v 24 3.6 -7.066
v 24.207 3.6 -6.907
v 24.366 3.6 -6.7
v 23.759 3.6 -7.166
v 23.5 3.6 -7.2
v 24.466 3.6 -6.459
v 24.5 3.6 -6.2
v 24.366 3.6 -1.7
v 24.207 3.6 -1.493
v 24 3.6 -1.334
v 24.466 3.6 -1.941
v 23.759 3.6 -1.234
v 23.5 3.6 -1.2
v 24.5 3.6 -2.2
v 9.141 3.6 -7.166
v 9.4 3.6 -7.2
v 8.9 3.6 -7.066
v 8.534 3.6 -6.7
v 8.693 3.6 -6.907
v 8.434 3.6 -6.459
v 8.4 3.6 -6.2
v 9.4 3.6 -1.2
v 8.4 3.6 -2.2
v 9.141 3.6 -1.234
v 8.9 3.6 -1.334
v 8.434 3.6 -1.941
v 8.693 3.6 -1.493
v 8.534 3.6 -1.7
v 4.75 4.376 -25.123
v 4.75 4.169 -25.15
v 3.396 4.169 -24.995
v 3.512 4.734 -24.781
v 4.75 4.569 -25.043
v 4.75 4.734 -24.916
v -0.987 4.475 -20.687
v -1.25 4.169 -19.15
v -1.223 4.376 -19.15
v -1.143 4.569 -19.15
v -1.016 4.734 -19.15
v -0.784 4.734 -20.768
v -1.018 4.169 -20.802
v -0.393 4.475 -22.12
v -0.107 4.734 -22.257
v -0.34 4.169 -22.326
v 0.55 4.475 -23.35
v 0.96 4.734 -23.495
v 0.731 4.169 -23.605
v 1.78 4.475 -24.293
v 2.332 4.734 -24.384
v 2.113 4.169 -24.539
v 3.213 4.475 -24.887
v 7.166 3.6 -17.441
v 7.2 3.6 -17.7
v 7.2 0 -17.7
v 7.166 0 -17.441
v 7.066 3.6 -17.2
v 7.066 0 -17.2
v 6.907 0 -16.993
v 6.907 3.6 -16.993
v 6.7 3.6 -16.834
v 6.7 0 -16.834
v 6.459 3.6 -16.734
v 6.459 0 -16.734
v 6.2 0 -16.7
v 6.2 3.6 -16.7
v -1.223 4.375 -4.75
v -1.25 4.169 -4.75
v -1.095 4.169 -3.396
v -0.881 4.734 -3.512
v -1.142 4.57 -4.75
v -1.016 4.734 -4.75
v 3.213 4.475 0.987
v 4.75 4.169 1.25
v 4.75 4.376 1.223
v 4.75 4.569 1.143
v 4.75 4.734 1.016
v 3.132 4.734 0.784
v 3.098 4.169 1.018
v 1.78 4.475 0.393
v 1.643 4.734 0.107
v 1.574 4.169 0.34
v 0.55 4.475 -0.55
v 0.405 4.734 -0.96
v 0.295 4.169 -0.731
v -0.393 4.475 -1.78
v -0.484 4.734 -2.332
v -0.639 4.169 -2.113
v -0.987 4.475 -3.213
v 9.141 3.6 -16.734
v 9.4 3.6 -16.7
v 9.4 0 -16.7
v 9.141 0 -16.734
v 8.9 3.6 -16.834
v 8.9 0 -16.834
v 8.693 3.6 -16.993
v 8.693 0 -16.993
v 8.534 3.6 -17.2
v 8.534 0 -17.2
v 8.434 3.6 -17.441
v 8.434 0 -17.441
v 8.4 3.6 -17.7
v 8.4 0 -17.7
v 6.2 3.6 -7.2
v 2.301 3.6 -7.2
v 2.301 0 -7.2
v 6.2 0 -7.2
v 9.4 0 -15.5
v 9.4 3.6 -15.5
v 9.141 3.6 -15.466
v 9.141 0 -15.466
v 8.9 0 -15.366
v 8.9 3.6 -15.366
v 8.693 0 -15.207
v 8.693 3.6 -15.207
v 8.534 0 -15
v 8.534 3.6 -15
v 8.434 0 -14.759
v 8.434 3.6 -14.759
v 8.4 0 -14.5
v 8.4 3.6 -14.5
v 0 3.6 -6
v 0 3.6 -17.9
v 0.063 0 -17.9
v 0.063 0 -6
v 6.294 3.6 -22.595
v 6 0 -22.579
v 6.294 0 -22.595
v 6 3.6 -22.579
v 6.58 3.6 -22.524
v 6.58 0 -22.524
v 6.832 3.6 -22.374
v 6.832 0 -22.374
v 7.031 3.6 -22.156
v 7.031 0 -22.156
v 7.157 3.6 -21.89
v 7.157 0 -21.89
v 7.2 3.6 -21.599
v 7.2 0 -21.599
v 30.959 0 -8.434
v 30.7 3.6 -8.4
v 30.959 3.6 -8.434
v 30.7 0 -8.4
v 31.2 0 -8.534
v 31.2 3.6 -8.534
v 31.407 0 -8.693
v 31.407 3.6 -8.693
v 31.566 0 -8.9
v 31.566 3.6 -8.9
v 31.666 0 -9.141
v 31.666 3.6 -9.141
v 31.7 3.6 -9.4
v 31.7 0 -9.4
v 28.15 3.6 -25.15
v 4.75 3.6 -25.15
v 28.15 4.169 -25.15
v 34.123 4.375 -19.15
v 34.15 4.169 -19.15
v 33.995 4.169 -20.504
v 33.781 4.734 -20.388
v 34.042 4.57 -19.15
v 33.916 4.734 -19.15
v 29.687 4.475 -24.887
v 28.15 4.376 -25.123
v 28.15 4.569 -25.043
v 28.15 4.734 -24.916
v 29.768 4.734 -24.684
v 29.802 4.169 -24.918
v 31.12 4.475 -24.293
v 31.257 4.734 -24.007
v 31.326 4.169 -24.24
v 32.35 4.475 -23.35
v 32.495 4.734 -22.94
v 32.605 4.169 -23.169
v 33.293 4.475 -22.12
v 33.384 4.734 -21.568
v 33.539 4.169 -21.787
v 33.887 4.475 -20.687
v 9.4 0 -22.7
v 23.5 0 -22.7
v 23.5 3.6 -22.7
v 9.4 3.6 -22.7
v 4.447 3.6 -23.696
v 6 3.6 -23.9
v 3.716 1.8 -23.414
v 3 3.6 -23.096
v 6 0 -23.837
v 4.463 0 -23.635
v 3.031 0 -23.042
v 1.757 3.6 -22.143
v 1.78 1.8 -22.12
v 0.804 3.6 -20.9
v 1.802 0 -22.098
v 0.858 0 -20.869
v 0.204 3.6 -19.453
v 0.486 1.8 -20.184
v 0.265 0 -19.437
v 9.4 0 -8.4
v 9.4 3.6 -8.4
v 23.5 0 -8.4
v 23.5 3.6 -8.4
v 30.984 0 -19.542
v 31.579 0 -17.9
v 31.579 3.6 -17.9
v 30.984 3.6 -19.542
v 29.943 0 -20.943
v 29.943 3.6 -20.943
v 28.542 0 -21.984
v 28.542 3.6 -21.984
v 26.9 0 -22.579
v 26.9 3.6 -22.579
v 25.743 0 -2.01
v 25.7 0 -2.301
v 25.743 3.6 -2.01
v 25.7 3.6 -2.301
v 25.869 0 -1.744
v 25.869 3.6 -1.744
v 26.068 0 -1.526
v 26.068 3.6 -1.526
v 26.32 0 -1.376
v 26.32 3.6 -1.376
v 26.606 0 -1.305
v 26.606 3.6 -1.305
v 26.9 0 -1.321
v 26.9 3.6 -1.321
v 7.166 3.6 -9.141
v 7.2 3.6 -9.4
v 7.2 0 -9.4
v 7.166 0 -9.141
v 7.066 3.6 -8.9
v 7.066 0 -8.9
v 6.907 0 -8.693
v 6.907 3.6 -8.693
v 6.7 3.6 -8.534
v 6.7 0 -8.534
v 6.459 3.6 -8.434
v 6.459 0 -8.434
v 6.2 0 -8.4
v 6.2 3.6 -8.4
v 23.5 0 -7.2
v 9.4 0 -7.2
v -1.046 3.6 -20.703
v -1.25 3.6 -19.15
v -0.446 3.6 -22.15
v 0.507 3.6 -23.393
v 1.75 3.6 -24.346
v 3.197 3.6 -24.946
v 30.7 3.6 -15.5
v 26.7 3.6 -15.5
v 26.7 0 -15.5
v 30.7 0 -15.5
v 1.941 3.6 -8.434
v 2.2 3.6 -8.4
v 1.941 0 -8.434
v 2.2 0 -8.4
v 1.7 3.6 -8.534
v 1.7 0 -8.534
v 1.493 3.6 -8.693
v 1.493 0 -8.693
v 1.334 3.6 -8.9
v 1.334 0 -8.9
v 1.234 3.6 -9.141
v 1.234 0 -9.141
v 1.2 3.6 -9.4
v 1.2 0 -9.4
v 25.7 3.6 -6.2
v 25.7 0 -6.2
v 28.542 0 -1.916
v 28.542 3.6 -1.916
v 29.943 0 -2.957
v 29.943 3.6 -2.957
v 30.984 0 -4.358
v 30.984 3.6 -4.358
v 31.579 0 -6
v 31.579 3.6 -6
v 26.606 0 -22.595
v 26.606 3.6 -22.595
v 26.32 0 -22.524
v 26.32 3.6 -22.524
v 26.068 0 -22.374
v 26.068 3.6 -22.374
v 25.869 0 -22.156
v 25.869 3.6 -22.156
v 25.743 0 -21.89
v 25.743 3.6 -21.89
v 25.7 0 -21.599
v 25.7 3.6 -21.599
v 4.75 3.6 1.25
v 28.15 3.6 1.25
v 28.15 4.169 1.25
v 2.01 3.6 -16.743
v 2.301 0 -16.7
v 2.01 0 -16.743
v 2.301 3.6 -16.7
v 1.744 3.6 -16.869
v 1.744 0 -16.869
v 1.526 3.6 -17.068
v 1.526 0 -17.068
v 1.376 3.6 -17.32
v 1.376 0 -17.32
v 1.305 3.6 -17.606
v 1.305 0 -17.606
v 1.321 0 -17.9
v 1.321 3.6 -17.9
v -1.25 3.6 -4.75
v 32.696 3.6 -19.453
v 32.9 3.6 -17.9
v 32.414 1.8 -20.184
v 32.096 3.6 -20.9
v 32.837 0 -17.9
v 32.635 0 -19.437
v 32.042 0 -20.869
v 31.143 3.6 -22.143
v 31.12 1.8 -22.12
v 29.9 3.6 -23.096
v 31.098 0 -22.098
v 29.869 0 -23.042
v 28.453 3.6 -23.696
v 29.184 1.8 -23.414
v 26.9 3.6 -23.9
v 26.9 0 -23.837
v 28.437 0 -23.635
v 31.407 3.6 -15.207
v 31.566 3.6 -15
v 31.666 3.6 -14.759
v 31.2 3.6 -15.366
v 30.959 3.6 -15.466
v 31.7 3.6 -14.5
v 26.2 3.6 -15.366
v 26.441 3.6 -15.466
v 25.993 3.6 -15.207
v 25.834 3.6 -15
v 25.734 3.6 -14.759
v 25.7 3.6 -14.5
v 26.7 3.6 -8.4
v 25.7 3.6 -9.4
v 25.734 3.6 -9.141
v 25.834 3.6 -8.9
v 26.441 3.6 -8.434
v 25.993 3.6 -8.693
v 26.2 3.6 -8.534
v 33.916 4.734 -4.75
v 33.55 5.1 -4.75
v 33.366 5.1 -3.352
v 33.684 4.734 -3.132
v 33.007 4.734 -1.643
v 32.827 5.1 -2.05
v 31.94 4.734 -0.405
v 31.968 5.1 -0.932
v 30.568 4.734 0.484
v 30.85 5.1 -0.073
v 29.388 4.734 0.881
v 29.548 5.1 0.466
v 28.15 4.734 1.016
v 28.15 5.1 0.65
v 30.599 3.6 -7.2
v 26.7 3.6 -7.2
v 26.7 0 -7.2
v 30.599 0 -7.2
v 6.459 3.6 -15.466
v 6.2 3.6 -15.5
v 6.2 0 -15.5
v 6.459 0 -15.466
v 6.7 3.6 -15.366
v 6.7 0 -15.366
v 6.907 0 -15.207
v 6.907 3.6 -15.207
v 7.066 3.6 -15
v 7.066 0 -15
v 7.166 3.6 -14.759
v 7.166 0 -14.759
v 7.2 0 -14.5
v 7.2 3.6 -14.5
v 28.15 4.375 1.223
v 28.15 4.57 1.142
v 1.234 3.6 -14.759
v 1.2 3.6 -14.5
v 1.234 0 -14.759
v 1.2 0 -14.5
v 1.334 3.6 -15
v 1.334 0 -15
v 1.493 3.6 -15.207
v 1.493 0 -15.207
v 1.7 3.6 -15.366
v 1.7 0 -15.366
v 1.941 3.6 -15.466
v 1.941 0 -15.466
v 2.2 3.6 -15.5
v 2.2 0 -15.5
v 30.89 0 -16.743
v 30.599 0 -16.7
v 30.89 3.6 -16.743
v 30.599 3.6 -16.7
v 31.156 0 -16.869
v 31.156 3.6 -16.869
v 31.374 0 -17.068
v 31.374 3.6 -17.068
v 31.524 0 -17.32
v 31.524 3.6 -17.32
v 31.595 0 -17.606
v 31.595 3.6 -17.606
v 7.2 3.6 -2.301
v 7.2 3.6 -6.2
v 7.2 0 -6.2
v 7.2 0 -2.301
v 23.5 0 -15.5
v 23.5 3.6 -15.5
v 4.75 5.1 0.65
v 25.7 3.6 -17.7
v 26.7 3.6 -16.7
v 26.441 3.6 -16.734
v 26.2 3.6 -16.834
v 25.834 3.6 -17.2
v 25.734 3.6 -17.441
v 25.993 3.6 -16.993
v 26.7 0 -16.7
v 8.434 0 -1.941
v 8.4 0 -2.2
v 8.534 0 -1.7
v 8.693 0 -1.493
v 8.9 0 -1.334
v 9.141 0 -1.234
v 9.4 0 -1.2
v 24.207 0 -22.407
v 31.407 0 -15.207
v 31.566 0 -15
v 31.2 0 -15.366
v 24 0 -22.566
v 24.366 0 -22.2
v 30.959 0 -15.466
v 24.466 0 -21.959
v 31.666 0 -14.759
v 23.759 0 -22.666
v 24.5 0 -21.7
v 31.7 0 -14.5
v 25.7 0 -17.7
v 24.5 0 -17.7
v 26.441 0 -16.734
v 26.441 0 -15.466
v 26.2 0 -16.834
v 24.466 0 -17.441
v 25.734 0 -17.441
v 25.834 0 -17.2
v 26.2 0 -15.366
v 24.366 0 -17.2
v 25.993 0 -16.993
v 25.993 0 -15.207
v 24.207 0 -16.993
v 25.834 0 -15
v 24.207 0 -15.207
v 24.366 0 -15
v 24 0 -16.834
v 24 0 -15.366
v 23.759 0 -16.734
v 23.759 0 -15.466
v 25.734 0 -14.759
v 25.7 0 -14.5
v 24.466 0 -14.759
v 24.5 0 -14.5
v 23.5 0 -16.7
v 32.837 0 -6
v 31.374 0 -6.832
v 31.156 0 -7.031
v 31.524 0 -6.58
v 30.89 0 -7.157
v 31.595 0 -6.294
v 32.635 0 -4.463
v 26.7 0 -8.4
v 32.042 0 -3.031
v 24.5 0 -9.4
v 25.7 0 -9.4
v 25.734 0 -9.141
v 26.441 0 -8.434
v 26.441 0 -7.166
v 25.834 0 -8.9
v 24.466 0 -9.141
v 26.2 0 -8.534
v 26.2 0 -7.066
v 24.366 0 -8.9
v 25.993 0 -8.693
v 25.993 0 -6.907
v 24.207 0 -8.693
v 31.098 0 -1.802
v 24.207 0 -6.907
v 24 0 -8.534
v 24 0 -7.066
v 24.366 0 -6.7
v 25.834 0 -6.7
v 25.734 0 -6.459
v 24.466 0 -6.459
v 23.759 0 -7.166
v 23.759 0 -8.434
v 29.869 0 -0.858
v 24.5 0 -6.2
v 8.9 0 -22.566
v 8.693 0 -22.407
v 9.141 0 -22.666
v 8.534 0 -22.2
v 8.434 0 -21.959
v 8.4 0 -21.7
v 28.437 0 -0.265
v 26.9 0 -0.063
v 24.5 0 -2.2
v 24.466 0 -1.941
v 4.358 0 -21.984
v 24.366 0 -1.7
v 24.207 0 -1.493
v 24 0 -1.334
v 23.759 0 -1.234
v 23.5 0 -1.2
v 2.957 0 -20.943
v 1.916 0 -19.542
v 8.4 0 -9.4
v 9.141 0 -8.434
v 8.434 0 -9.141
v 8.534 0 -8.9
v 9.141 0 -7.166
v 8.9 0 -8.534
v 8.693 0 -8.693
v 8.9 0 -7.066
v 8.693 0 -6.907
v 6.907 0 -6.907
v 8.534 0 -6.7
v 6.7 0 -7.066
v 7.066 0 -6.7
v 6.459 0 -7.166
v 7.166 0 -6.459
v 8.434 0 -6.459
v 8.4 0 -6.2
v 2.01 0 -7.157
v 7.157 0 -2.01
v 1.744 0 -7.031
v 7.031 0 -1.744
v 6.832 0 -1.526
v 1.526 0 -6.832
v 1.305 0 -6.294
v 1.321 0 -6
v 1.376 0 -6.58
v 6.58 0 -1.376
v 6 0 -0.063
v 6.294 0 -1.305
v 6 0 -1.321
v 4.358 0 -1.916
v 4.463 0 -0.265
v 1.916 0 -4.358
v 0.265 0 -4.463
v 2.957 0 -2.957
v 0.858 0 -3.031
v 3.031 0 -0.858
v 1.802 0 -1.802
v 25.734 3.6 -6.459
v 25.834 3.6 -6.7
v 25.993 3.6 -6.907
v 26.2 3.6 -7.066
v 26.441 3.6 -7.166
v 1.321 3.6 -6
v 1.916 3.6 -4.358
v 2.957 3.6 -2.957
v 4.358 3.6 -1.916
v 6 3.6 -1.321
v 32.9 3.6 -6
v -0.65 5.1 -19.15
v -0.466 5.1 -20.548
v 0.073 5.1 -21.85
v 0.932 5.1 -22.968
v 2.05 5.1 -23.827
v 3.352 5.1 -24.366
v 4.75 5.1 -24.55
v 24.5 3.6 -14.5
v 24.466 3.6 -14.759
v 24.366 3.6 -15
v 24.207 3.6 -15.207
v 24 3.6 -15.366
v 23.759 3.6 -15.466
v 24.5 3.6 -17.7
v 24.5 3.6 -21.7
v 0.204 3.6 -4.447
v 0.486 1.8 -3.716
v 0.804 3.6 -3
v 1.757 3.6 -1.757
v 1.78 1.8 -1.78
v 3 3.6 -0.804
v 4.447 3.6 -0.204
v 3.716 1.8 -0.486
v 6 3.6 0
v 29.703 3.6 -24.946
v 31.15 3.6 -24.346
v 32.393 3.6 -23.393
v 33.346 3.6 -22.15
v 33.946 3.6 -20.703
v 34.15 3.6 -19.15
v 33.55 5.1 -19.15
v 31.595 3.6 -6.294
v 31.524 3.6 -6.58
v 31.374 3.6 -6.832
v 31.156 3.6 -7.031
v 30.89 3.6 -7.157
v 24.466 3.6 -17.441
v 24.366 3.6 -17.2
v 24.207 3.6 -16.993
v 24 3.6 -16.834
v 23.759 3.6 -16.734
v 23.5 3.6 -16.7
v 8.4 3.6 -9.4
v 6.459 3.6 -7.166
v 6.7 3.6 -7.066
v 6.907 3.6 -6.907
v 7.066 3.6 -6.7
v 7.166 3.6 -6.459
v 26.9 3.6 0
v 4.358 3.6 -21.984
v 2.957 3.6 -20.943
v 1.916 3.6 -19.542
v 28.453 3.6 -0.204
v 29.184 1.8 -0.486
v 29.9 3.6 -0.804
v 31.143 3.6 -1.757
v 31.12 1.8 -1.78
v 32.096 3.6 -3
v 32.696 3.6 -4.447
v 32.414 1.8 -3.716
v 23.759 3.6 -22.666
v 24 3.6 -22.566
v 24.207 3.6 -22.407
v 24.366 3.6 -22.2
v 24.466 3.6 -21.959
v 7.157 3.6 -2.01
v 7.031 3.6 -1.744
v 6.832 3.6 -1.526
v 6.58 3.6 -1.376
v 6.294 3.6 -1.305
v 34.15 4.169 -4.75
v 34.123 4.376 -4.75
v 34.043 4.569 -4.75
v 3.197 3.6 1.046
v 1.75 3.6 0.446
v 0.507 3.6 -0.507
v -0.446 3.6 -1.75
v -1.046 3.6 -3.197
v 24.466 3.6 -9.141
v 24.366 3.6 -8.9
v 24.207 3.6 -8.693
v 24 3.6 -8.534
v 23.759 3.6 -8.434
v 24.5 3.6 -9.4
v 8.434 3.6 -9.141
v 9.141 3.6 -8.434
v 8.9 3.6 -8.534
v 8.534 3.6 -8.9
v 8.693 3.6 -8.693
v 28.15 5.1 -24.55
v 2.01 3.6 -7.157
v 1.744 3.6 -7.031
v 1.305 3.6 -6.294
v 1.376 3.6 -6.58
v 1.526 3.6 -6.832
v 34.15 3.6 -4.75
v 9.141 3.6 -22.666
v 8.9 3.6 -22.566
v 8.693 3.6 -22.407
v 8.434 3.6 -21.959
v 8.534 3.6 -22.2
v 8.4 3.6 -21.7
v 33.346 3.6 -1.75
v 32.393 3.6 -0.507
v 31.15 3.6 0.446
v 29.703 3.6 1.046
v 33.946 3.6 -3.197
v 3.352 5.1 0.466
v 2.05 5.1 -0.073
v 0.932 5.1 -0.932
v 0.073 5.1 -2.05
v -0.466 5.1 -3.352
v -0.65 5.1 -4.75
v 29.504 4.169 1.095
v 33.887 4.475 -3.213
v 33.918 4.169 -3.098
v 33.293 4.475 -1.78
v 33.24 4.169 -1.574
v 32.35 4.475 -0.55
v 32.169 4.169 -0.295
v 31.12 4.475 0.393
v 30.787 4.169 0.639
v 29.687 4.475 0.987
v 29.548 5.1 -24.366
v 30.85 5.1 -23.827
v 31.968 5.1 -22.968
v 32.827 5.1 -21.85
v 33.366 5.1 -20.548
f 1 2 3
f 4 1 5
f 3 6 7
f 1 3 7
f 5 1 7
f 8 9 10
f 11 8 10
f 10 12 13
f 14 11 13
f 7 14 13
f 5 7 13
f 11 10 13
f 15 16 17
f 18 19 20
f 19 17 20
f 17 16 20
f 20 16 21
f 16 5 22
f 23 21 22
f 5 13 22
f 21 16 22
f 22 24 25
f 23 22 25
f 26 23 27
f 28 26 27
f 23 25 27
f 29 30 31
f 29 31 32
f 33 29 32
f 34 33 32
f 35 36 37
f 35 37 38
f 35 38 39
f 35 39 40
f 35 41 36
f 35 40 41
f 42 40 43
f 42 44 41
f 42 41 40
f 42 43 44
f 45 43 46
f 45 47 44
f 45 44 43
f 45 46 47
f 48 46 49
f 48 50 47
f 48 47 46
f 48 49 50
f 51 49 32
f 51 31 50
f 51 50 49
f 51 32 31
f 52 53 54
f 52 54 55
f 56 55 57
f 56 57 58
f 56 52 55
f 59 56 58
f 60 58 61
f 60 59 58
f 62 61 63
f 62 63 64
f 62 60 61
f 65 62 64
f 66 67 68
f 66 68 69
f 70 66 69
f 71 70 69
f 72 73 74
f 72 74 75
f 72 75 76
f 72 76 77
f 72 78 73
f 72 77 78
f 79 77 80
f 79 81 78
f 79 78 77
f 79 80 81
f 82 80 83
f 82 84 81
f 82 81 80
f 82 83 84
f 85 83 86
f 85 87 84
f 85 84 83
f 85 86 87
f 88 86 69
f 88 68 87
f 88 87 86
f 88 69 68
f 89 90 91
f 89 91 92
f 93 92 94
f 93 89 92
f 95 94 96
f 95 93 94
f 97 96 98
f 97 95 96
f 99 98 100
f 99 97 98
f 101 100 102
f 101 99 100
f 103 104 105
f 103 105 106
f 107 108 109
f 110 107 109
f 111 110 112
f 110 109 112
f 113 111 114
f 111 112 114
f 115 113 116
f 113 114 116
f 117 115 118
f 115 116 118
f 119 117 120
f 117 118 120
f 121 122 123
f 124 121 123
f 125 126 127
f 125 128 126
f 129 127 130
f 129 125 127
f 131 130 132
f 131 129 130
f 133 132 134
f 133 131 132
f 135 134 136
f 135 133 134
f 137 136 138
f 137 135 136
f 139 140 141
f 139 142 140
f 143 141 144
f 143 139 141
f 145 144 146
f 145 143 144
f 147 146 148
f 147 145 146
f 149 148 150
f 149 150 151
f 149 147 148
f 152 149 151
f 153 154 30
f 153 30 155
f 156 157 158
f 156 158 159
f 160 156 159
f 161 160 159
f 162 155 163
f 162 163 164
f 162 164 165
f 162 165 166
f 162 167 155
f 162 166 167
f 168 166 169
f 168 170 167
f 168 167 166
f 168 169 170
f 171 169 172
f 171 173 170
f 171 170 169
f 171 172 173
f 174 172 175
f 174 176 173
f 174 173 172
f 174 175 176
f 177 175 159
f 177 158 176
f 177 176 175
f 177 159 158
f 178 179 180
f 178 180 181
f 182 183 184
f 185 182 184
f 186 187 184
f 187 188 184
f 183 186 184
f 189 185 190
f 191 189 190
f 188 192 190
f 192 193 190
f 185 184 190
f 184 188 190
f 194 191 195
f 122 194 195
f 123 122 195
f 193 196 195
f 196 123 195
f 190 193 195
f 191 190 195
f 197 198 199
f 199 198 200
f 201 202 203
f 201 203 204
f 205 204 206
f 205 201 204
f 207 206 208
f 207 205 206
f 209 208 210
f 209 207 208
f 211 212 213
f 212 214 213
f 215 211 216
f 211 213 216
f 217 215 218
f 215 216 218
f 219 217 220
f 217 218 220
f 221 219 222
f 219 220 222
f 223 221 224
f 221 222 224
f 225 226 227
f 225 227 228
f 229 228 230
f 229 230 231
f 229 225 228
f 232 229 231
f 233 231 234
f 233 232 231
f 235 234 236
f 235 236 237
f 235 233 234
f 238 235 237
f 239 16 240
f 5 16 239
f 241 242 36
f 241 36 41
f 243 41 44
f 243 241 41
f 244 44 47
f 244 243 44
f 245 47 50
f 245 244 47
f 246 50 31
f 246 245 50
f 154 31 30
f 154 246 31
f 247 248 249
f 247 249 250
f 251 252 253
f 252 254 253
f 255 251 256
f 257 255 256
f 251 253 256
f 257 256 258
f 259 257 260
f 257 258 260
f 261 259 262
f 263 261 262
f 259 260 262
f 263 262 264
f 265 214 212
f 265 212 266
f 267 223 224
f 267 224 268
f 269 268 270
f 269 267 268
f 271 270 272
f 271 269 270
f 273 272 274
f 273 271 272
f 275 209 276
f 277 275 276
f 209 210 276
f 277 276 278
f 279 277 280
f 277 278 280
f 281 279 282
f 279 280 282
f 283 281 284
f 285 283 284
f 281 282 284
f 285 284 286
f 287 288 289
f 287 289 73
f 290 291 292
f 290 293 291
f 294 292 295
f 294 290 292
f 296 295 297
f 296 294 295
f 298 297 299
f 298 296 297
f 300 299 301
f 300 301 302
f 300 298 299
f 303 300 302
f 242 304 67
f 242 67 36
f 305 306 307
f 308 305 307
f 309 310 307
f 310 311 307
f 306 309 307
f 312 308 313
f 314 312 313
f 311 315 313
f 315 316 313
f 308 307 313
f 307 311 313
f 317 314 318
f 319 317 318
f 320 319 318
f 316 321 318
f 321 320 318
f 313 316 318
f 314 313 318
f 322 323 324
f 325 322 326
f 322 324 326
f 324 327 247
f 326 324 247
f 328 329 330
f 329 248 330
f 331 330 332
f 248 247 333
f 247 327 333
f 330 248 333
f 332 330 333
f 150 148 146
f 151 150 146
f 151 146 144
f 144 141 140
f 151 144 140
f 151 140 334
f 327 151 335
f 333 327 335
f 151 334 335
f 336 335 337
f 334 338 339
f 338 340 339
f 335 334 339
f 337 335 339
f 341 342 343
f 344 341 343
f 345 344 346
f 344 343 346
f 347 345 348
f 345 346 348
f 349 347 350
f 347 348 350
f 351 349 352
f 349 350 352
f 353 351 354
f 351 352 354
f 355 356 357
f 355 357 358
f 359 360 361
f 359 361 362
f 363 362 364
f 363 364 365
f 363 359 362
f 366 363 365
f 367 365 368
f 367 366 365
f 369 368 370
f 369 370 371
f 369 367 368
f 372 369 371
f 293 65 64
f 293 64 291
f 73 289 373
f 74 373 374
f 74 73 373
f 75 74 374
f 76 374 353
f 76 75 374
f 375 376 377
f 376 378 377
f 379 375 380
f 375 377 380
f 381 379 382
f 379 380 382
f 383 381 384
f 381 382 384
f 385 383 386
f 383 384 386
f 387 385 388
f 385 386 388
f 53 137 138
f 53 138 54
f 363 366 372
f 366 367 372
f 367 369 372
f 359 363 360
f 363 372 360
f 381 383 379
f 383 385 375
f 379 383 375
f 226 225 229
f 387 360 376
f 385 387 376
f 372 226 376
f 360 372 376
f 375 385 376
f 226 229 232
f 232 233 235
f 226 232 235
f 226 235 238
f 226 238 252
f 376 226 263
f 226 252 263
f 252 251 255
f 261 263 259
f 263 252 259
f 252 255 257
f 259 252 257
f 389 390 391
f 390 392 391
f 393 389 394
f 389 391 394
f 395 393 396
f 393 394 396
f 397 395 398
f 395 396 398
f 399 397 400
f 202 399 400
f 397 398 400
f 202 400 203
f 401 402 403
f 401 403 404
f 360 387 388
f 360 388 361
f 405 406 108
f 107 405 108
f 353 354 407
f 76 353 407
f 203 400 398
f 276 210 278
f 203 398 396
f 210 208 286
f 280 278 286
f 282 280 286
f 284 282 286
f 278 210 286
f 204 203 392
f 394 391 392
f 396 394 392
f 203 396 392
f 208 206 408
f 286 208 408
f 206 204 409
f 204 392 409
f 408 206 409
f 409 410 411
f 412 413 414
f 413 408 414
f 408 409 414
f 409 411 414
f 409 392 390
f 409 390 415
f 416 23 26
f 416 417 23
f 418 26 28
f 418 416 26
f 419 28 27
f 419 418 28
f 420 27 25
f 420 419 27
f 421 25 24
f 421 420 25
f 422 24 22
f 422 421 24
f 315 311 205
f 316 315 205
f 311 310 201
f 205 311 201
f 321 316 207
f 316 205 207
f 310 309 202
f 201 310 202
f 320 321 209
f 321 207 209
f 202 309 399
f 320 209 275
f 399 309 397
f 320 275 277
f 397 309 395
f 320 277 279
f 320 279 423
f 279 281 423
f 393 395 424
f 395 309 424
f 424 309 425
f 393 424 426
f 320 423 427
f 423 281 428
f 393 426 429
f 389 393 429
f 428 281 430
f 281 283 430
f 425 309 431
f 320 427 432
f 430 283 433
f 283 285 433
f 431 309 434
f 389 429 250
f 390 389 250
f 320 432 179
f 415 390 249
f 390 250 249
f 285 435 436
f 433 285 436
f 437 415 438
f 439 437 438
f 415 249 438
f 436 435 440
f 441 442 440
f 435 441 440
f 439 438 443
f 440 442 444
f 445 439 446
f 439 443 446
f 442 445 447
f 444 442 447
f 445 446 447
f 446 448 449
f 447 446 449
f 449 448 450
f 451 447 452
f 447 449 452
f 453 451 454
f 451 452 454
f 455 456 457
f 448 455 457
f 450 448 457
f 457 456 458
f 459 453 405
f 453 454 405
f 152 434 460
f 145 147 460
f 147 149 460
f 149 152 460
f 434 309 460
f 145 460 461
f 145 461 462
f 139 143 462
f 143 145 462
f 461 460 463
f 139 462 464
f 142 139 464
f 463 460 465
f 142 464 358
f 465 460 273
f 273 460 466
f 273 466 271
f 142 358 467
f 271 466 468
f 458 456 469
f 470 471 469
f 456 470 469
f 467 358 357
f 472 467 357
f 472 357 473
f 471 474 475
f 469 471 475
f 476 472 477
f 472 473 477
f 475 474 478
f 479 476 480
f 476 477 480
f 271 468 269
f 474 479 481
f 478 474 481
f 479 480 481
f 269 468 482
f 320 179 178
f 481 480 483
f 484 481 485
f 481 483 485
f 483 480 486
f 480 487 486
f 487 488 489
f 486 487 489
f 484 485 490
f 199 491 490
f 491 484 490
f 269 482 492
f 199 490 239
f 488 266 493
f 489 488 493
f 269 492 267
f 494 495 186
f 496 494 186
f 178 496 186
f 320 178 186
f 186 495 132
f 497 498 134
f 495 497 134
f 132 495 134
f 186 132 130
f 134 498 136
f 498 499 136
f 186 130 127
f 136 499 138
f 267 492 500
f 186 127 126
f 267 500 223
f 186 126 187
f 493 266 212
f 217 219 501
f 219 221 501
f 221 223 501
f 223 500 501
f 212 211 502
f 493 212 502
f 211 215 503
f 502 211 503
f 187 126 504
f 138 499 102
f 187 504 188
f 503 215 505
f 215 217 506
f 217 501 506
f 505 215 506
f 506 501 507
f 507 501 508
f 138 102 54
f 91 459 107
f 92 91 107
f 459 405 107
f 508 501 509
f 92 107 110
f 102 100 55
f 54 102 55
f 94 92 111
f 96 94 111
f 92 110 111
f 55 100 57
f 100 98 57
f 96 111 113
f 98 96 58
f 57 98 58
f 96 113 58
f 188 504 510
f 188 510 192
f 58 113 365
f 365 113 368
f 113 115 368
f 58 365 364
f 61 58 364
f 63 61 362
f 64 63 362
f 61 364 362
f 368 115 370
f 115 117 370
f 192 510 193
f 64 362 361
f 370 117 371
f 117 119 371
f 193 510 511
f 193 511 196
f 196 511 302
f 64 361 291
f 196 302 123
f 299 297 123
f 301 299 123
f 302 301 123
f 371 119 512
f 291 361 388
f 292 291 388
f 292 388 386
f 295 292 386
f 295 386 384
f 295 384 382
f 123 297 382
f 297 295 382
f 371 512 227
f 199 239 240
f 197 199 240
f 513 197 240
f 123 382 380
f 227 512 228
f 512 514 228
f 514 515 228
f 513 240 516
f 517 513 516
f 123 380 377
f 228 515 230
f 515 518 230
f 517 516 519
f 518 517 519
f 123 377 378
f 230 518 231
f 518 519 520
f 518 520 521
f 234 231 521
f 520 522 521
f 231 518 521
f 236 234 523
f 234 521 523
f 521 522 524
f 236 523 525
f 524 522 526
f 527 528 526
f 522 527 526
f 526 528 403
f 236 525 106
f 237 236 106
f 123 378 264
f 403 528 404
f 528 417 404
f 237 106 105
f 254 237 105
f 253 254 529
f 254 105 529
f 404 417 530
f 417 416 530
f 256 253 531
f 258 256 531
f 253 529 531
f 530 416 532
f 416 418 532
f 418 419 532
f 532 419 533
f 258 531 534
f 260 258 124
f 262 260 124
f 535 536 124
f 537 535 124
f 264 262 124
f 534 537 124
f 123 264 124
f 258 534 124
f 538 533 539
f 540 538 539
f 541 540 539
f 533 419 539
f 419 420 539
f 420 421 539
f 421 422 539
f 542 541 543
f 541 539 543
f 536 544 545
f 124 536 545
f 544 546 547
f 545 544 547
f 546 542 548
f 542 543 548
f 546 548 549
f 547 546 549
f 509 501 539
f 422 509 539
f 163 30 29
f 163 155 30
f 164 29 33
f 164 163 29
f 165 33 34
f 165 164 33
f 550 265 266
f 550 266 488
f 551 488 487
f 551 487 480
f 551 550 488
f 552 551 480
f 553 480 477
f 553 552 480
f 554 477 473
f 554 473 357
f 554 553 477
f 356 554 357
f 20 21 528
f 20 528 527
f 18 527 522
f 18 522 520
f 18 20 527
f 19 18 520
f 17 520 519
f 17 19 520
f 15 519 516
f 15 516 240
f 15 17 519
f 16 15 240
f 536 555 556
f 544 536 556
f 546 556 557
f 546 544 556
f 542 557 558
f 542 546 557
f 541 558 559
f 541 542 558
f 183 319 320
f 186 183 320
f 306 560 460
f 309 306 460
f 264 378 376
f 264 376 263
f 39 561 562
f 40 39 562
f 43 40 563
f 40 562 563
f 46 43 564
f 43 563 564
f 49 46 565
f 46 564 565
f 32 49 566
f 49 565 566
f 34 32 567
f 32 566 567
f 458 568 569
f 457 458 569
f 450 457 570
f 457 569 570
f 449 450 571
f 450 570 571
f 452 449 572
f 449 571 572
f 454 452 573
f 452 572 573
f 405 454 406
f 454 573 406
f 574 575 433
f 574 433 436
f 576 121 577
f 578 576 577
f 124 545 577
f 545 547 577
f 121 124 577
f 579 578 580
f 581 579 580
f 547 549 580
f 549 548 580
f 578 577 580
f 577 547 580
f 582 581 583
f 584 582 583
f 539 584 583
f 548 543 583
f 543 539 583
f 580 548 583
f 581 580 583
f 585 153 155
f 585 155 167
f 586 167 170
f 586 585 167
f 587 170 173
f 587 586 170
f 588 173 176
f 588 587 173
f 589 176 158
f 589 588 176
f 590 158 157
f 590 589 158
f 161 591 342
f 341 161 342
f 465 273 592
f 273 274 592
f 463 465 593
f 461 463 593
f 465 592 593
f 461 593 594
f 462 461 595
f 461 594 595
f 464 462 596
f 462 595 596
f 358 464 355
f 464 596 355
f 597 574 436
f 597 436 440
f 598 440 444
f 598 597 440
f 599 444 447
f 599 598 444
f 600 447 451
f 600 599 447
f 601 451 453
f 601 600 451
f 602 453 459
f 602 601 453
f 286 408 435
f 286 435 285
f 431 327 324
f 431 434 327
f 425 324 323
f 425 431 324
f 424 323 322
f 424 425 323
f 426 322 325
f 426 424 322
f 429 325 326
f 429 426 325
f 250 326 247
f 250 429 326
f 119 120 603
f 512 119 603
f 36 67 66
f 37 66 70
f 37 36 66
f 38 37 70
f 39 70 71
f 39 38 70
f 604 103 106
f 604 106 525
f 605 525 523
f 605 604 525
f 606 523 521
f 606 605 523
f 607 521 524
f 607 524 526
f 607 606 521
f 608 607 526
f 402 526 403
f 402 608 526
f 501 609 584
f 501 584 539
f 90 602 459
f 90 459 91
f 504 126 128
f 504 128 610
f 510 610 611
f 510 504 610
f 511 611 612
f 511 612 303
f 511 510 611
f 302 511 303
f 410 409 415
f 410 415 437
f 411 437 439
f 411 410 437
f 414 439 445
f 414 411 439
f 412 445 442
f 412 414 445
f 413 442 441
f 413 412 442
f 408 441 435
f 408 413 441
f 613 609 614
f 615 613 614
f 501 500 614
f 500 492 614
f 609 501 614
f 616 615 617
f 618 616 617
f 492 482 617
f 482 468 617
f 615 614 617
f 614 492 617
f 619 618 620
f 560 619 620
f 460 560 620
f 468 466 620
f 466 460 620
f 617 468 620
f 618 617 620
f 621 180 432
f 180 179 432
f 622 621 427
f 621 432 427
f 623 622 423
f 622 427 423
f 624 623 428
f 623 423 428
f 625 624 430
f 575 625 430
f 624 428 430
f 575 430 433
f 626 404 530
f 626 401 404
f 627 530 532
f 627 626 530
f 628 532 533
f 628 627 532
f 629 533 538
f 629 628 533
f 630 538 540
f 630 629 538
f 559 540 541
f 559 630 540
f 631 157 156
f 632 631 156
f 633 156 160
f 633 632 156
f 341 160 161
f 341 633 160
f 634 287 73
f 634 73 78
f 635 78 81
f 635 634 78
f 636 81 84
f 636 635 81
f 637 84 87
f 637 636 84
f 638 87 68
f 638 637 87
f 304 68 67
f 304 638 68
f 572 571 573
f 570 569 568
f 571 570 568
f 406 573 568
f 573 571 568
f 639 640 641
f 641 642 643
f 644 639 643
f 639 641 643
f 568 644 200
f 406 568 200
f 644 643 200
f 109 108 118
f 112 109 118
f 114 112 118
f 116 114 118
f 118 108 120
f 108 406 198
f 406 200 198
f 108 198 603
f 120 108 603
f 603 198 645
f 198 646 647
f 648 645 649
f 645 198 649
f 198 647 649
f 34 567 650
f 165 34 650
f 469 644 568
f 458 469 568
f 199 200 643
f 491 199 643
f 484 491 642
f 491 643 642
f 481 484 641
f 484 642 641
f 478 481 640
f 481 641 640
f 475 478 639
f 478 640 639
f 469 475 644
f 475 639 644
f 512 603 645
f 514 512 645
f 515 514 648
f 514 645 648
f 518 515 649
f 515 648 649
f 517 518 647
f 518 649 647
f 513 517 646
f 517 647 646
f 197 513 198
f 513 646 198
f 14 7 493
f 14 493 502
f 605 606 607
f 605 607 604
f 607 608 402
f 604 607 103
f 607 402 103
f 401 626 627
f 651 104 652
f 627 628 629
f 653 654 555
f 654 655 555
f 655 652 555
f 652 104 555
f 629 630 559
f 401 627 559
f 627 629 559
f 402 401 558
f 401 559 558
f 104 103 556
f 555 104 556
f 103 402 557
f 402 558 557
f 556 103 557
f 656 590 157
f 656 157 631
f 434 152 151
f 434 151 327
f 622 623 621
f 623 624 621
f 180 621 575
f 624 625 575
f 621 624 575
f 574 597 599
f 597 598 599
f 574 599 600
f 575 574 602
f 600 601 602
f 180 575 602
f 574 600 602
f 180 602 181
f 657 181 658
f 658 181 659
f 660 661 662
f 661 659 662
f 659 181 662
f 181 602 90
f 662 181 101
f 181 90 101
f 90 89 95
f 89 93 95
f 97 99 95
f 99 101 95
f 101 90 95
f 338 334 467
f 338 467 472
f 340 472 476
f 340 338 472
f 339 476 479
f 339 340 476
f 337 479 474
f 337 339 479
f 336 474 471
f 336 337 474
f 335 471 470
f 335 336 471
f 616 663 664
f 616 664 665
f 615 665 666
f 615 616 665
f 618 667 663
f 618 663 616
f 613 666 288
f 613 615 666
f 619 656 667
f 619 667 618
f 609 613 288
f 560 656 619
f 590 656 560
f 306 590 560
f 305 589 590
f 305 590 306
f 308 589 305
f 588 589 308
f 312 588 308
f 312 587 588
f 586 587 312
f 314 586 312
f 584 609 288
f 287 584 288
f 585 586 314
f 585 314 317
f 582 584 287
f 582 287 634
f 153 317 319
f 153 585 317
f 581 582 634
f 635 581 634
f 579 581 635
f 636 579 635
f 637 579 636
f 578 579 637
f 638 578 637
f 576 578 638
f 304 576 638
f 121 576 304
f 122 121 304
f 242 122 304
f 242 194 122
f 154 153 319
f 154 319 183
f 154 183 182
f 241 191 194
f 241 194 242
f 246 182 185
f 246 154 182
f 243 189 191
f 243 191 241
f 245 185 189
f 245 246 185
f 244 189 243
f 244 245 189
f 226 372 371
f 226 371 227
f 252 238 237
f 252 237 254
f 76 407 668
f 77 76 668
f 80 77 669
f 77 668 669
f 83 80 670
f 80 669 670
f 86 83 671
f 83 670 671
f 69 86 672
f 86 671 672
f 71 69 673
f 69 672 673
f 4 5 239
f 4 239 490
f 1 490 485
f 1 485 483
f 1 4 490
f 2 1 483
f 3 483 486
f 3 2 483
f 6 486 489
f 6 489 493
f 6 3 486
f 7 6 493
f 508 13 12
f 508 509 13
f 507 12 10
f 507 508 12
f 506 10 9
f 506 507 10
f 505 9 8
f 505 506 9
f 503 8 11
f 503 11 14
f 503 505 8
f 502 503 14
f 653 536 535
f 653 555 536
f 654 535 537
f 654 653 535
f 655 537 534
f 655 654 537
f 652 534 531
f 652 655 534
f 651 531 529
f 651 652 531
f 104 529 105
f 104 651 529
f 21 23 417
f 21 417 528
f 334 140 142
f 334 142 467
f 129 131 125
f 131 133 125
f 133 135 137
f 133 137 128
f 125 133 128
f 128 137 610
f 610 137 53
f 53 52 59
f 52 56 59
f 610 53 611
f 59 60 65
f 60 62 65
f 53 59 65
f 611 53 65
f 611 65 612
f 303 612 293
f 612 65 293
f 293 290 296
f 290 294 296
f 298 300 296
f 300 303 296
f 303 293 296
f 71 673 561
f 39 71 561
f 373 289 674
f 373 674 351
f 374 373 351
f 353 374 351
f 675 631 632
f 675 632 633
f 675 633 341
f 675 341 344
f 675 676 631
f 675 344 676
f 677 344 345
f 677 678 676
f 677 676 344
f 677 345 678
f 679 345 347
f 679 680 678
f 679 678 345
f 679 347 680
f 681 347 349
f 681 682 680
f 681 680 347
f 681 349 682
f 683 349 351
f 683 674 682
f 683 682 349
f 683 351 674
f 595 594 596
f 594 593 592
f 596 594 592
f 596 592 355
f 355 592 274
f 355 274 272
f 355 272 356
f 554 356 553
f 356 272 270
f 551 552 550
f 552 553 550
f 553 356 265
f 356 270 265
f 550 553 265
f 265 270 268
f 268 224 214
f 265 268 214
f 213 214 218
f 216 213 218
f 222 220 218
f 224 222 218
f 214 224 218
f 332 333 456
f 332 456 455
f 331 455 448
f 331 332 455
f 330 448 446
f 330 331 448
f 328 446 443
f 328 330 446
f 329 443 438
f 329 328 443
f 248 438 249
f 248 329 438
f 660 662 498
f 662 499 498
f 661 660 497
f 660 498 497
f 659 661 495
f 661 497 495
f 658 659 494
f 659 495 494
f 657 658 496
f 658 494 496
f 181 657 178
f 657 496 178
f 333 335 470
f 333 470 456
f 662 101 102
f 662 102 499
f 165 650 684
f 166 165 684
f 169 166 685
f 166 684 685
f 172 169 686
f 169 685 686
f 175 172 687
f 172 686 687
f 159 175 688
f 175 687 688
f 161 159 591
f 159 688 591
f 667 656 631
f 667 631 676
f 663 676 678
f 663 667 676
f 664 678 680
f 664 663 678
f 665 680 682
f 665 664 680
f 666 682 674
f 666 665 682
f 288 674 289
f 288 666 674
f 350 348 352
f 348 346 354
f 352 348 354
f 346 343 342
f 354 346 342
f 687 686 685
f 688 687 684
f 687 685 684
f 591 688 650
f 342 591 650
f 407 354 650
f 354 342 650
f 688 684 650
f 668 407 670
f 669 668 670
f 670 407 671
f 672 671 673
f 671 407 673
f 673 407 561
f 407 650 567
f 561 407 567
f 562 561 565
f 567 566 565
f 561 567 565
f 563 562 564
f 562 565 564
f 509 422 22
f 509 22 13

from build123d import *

# Parameters (mm, degrees)
BOSS_EXTRUDE1_DEPTH = 3.6
BOSS_EXTRUDE2_DEPTH = 1.5
CUT_EXTRUDE1_DEPTH  = 3.6
BOSS_EXTRUDE5_DEPTH = 3.6
CHAMFER1_SIZE       = 3.6
CHAMFER1_SIZE_2     = 0.062838234
FILLET3_R           = 1
CHAMFER2_SIZE       = 0.6
FILLET4_R           = 0.8


with BuildPart() as part:
    # Sketch1 → Boss-Extrude1 (new body)
    with BuildSketch(Plane(origin=(0, 0, 0), x_dir=(1, 0, 0), z_dir=(0, 1, 0))):
        with BuildLine():
            Line((6, 0), (26.9, 0))
            ThreePointArc((26.9, 0), (31.142640687, 1.757359313), (32.9, 6))
            Line((32.9, 6), (32.9, 17.9))
            ThreePointArc((32.9, 17.9), (31.142640687, 22.142640687), (26.9, 23.9))
            Line((26.9, 23.9), (6, 23.9))
            ThreePointArc((6, 23.9), (1.757359313, 22.142640687), (0, 17.9))
            Line((0, 17.9), (0, 6))
            ThreePointArc((0, 6), (1.757359313, 1.757359313), (6, 0))
        make_face()
    extrude(amount=BOSS_EXTRUDE1_DEPTH)

    # Sketch2 → Boss-Extrude2 (add)
    with BuildSketch(Plane(origin=(0, 3.6, 0), x_dir=(1, 0, 0), z_dir=(0, 1, 0))):
        with BuildLine():
            Line((4.75, 25.15), (28.15, 25.15))
            ThreePointArc((28.15, 25.15), (32.392640687, 23.392640687), (34.15, 19.15))
            Line((34.15, 19.15), (34.15, 4.75))
            ThreePointArc((34.15, 4.75), (32.392640687, 0.507359313), (28.15, -1.25))
            Line((28.15, -1.25), (4.75, -1.25))
            ThreePointArc((4.75, -1.25), (0.507359313, 0.507359313), (-1.25, 4.75))
            Line((-1.25, 4.75), (-1.25, 19.15))
            ThreePointArc((-1.25, 19.15), (0.507359313, 23.392640687), (4.75, 25.15))
        make_face()
    extrude(amount=BOSS_EXTRUDE2_DEPTH)

    # Sketch3 → Cut-Extrude1 (cut)
    with BuildSketch(Plane.XZ):
        with BuildLine():
            Line((25.7, -22.7), (7.2, -22.7))
            ThreePointArc((7.2, -22.7), (2.957359313, -20.942640687), (1.2, -16.7))
            Line((1.2, -16.7), (1.2, -7.2))
            ThreePointArc((1.2, -7.2), (2.957359313, -2.957359313), (7.2, -1.2))
            Line((7.2, -1.2), (25.7, -1.2))
            ThreePointArc((25.7, -1.2), (29.942640687, -2.957359313), (31.7, -7.2))
            Line((31.7, -7.2), (31.7, -16.7))
            ThreePointArc((31.7, -16.7), (29.942640687, -20.942640687), (25.7, -22.7))
        make_face()
    extrude(amount=-CUT_EXTRUDE1_DEPTH, mode=Mode.SUBTRACT)

    # Sketch5 → Boss-Extrude5 (add)
    with BuildSketch(Plane.XZ.offset(-3.6)):
        with BuildLine():
            Line((7.2, -1.2), (8.4, -1.2))
            Line((8.4, -1.2), (8.4, -6.2))
            ThreePointArc((8.4, -6.2), (8.692893219, -6.907106781), (9.4, -7.2))
            Line((9.4, -7.2), (23.5, -7.2))
            ThreePointArc((23.5, -7.2), (24.207106781, -6.907106781), (24.5, -6.2))
            Line((24.5, -6.2), (24.5, -1.2))
            Line((24.5, -1.2), (25.7, -1.2))
            Line((25.7, -1.2), (25.7, -6.2))
            ThreePointArc((25.7, -6.2), (25.992893219, -6.907106781), (26.7, -7.2))
            Line((26.7, -7.2), (31.7, -7.2))
            Line((31.7, -7.2), (31.7, -8.4))
            Line((31.7, -8.4), (26.7, -8.4))
            ThreePointArc((26.7, -8.4), (25.992893219, -8.692893219), (25.7, -9.4))
            Line((25.7, -9.4), (25.7, -14.5))
            ThreePointArc((25.7, -14.5), (25.992893219, -15.207106781), (26.7, -15.5))
            Line((26.7, -15.5), (31.7, -15.5))
            Line((31.7, -15.5), (31.7, -16.7))
            Line((31.7, -16.7), (26.7, -16.7))
            ThreePointArc((26.7, -16.7), (25.992893219, -16.992893219), (25.7, -17.7))
            Line((25.7, -17.7), (25.7, -22.7))
            Line((25.7, -22.7), (24.5, -22.7))
            Line((24.5, -22.7), (24.5, -17.7))
            ThreePointArc((24.5, -17.7), (24.207106781, -16.992893219), (23.5, -16.7))
            Line((23.5, -16.7), (9.4, -16.7))
            ThreePointArc((9.4, -16.7), (8.692893219, -16.992893219), (8.4, -17.7))
            Line((8.4, -17.7), (8.4, -22.7))
            Line((8.4, -22.7), (7.2, -22.7))
            Line((7.2, -22.7), (7.2, -17.7))
            ThreePointArc((7.2, -17.7), (6.907106781, -16.992893219), (6.2, -16.7))
            Line((6.2, -16.7), (1.2, -16.7))
            Line((1.2, -16.7), (1.2, -15.5))
            Line((1.2, -15.5), (6.2, -15.5))
            ThreePointArc((6.2, -15.5), (6.907106781, -15.207106781), (7.2, -14.5))
            Line((7.2, -14.5), (7.2, -9.4))
            ThreePointArc((7.2, -9.4), (6.907106781, -8.692893219), (6.2, -8.4))
            Line((6.2, -8.4), (1.2, -8.4))
            Line((1.2, -8.4), (1.2, -7.2))
            Line((1.2, -7.2), (6.2, -7.2))
            ThreePointArc((6.2, -7.2), (6.907106781, -6.907106781), (7.2, -6.2))
            Line((7.2, -6.2), (7.2, -1.2))
        make_face()
        with BuildLine():
            Line((9.4, -8.4), (23.5, -8.4))
            ThreePointArc((23.5, -8.4), (24.207106781, -8.692893219), (24.5, -9.4))
            Line((24.5, -9.4), (24.5, -14.5))
            ThreePointArc((24.5, -14.5), (24.207106781, -15.207106781), (23.5, -15.5))
            Line((23.5, -15.5), (9.4, -15.5))
            ThreePointArc((9.4, -15.5), (8.692893219, -15.207106781), (8.4, -14.5))
            Line((8.4, -14.5), (8.4, -9.4))
            ThreePointArc((8.4, -9.4), (8.692893219, -8.692893219), (9.4, -8.4))
        make_face(mode=Mode.SUBTRACT)
    extrude(amount=BOSS_EXTRUDE5_DEPTH)

    # Chamfer1
    # the kernel refuses this chamfer: 3.6, 0.062838234 mm, written as the material it takes off along each edge
    with BuildSketch(Plane(origin=(0, 0, -17.9), x_dir=(-0.0006712501823120534, 0.9999997747115711, 0), z_dir=(0, 0, 1))) as chamfer1_piece_1_section:
        Polygon((CHAMFER1_SIZE * 0.999999774712, -CHAMFER1_SIZE * 0.000671250182312), (-CHAMFER1_SIZE_2 * 0.000671250179552, -CHAMFER1_SIZE_2 * 0.999999770599), (0, 0), align=None)
    chamfer1_piece_1 = extrude(amount=11.9, mode=Mode.PRIVATE)
    chamfer1_piece_1 = split(chamfer1_piece_1, bisect_by=Plane(origin=(-0.01902042, 3.6, -11.95), z_dir=(0, -1, 0)), keep=Keep.TOP, mode=Mode.PRIVATE)
    add(chamfer1_piece_1, mode=Mode.SUBTRACT)
    with BuildSketch(Plane(origin=(6, 0, -6), x_dir=(-1, 0, 0), z_dir=(0, 0, -1))) as chamfer1_piece_2_section:
        Polygon((6, CHAMFER1_SIZE), (6 - CHAMFER1_SIZE_2 * 0.999999995888, 0), (6, 0), align=None)
    chamfer1_piece_2 = revolve(axis=Axis((6, 0, -6), (0, 1, 0)), revolution_arc=90, mode=Mode.PRIVATE)
    chamfer1_piece_2 = split(chamfer1_piece_2, bisect_by=Plane(origin=(1.769655981, 3.6, -1.769655981), z_dir=(0, -1, 0)), keep=Keep.TOP, mode=Mode.PRIVATE)
    add(chamfer1_piece_2, mode=Mode.SUBTRACT)
    with BuildSketch(Plane(origin=(6, 0, -17.9), x_dir=(0, 0, -1), z_dir=(1, 0, 0))) as chamfer1_piece_3_section:
        Polygon((6, CHAMFER1_SIZE), (6 - CHAMFER1_SIZE_2 * 0.999999995888, 0), (6, 0), align=None)
    chamfer1_piece_3 = revolve(axis=Axis((6, 0, -17.9), (0, 1, 0)), revolution_arc=90, mode=Mode.PRIVATE)
    chamfer1_piece_3 = split(chamfer1_piece_3, bisect_by=Plane(origin=(1.769655981, 3.6, -22.130344019), z_dir=(0, -1, 0)), keep=Keep.TOP, mode=Mode.PRIVATE)
    add(chamfer1_piece_3, mode=Mode.SUBTRACT)
    with BuildSketch(Plane(origin=(6, 0, 0), x_dir=(0, 0.9999997747115711, 0.0006712501823120534), z_dir=(1, 0, 0))) as chamfer1_piece_4_section:
        Polygon((CHAMFER1_SIZE * 0.999999774712, -CHAMFER1_SIZE * 0.000671250182312), (-CHAMFER1_SIZE_2 * 0.000671250179552, -CHAMFER1_SIZE_2 * 0.999999770599), (0, 0), align=None)
    chamfer1_piece_4 = extrude(amount=20.9, mode=Mode.PRIVATE)
    chamfer1_piece_4 = split(chamfer1_piece_4, bisect_by=Plane(origin=(16.45, 3.6, 0.01902042), z_dir=(0, -1, 0)), keep=Keep.TOP, mode=Mode.PRIVATE)
    add(chamfer1_piece_4, mode=Mode.SUBTRACT)
    with BuildSketch(Plane(origin=(26.9, 0, -23.9), x_dir=(0, 0.9999997747115711, -0.0006712501823119971), z_dir=(-1, 0, 0))) as chamfer1_piece_5_section:
        Polygon((CHAMFER1_SIZE * 0.999999774712, -CHAMFER1_SIZE * 0.000671250182312), (-CHAMFER1_SIZE_2 * 0.000671250179552, -CHAMFER1_SIZE_2 * 0.999999770599), (0, 0), align=None)
    chamfer1_piece_5 = extrude(amount=20.9, mode=Mode.PRIVATE)
    chamfer1_piece_5 = split(chamfer1_piece_5, bisect_by=Plane(origin=(16.45, 3.6, -23.91902042), z_dir=(0, -1, 0)), keep=Keep.TOP, mode=Mode.PRIVATE)
    add(chamfer1_piece_5, mode=Mode.SUBTRACT)
    with BuildSketch(Plane(origin=(26.9, 0, -6), x_dir=(0, 0, 1), z_dir=(-1, 0, 0))) as chamfer1_piece_6_section:
        Polygon((6, CHAMFER1_SIZE), (6 - CHAMFER1_SIZE_2 * 0.999999995888, 0), (6, 0), align=None)
    chamfer1_piece_6 = revolve(axis=Axis((26.9, 0, -6), (0, 1, 0)), revolution_arc=90, mode=Mode.PRIVATE)
    chamfer1_piece_6 = split(chamfer1_piece_6, bisect_by=Plane(origin=(31.130344019, 3.6, -1.769655981), z_dir=(0, -1, 0)), keep=Keep.TOP, mode=Mode.PRIVATE)
    add(chamfer1_piece_6, mode=Mode.SUBTRACT)
    with BuildSketch(Plane(origin=(26.9, 0, -17.9), x_dir=(1, 0, 0), z_dir=(0, 0, 1))) as chamfer1_piece_7_section:
        Polygon((6, CHAMFER1_SIZE), (6 - CHAMFER1_SIZE_2 * 0.999999995888, 0), (6, 0), align=None)
    chamfer1_piece_7 = revolve(axis=Axis((26.9, 0, -17.9), (0, 1, 0)), revolution_arc=90, mode=Mode.PRIVATE)
    chamfer1_piece_7 = split(chamfer1_piece_7, bisect_by=Plane(origin=(31.130344019, 3.6, -22.130344019), z_dir=(0, -1, 0)), keep=Keep.TOP, mode=Mode.PRIVATE)
    add(chamfer1_piece_7, mode=Mode.SUBTRACT)
    with BuildSketch(Plane(origin=(32.9, 0, -6), x_dir=(0.000671250182312946, 0.9999997747115711, 0), z_dir=(0, 0, -1))) as chamfer1_piece_8_section:
        Polygon((CHAMFER1_SIZE * 0.999999774712, -CHAMFER1_SIZE * 0.000671250182313), (-CHAMFER1_SIZE_2 * 0.000671250179553, -CHAMFER1_SIZE_2 * 0.999999770599), (0, 0), align=None)
    chamfer1_piece_8 = extrude(amount=11.9, mode=Mode.PRIVATE)
    chamfer1_piece_8 = split(chamfer1_piece_8, bisect_by=Plane(origin=(32.91902042, 3.6, -11.95), z_dir=(0, -1, 0)), keep=Keep.TOP, mode=Mode.PRIVATE)
    add(chamfer1_piece_8, mode=Mode.SUBTRACT)

    # Fillet3
    fillet3_edges = [part.edges().sort_by_distance(p)[0] for p in [
        (1.2, 1.8, -8.4),
        (1.2, 1.8, -15.5),
        (8.4, 1.8, -22.7),
        (24.5, 1.8, -22.7),
        (31.7, 1.8, -15.5),
        (31.7, 1.8, -8.4),
        (24.5, 1.8, -1.2),
        (8.4, 1.8, -1.2),
        (7.2, 1.8, -22.7),
        (1.2, 1.8, -16.7),
        (1.2, 1.8, -7.2),
        (7.2, 1.8, -1.2),
        (25.7, 1.8, -1.2),
        (31.7, 1.8, -7.2),
        (31.7, 1.8, -16.7),
        (25.7, 1.8, -22.7),
    ]]
    fillet(fillet3_edges, radius=FILLET3_R)

    # Chamfer2
    chamfer2_edges = [part.edges().sort_by_distance(p)[0] for p in [
        (0.507359313, 5.1, -0.507359313),
        (16.45, 5.1, 1.25),
        (32.392640687, 5.1, -0.507359313),
        (34.15, 5.1, -11.95),
        (32.392640687, 5.1, -23.392640687),
        (16.45, 5.1, -25.15),
        (0.507359313, 5.1, -23.392640687),
        (-1.25, 5.1, -11.95),
    ]]
    chamfer(chamfer2_edges, length=CHAMFER2_SIZE)

    # Fillet4
    fillet4_edges = [part.edges().sort_by_distance(p)[0] for p in [
        (16.45, 4.5, -25.15),
        (0.507359313, 4.5, -23.392640687),
        (32.392640687, 4.5, -23.392640687),
        (-1.25, 4.5, -11.95),
        (34.15, 4.5, -11.95),
        (0.507359313, 4.5, -0.507359313),
        (32.392640687, 4.5, -0.507359313),
        (16.45, 4.5, 1.25),
    ]]
    fillet(fillet4_edges, radius=FILLET4_R)


solid = part.part
